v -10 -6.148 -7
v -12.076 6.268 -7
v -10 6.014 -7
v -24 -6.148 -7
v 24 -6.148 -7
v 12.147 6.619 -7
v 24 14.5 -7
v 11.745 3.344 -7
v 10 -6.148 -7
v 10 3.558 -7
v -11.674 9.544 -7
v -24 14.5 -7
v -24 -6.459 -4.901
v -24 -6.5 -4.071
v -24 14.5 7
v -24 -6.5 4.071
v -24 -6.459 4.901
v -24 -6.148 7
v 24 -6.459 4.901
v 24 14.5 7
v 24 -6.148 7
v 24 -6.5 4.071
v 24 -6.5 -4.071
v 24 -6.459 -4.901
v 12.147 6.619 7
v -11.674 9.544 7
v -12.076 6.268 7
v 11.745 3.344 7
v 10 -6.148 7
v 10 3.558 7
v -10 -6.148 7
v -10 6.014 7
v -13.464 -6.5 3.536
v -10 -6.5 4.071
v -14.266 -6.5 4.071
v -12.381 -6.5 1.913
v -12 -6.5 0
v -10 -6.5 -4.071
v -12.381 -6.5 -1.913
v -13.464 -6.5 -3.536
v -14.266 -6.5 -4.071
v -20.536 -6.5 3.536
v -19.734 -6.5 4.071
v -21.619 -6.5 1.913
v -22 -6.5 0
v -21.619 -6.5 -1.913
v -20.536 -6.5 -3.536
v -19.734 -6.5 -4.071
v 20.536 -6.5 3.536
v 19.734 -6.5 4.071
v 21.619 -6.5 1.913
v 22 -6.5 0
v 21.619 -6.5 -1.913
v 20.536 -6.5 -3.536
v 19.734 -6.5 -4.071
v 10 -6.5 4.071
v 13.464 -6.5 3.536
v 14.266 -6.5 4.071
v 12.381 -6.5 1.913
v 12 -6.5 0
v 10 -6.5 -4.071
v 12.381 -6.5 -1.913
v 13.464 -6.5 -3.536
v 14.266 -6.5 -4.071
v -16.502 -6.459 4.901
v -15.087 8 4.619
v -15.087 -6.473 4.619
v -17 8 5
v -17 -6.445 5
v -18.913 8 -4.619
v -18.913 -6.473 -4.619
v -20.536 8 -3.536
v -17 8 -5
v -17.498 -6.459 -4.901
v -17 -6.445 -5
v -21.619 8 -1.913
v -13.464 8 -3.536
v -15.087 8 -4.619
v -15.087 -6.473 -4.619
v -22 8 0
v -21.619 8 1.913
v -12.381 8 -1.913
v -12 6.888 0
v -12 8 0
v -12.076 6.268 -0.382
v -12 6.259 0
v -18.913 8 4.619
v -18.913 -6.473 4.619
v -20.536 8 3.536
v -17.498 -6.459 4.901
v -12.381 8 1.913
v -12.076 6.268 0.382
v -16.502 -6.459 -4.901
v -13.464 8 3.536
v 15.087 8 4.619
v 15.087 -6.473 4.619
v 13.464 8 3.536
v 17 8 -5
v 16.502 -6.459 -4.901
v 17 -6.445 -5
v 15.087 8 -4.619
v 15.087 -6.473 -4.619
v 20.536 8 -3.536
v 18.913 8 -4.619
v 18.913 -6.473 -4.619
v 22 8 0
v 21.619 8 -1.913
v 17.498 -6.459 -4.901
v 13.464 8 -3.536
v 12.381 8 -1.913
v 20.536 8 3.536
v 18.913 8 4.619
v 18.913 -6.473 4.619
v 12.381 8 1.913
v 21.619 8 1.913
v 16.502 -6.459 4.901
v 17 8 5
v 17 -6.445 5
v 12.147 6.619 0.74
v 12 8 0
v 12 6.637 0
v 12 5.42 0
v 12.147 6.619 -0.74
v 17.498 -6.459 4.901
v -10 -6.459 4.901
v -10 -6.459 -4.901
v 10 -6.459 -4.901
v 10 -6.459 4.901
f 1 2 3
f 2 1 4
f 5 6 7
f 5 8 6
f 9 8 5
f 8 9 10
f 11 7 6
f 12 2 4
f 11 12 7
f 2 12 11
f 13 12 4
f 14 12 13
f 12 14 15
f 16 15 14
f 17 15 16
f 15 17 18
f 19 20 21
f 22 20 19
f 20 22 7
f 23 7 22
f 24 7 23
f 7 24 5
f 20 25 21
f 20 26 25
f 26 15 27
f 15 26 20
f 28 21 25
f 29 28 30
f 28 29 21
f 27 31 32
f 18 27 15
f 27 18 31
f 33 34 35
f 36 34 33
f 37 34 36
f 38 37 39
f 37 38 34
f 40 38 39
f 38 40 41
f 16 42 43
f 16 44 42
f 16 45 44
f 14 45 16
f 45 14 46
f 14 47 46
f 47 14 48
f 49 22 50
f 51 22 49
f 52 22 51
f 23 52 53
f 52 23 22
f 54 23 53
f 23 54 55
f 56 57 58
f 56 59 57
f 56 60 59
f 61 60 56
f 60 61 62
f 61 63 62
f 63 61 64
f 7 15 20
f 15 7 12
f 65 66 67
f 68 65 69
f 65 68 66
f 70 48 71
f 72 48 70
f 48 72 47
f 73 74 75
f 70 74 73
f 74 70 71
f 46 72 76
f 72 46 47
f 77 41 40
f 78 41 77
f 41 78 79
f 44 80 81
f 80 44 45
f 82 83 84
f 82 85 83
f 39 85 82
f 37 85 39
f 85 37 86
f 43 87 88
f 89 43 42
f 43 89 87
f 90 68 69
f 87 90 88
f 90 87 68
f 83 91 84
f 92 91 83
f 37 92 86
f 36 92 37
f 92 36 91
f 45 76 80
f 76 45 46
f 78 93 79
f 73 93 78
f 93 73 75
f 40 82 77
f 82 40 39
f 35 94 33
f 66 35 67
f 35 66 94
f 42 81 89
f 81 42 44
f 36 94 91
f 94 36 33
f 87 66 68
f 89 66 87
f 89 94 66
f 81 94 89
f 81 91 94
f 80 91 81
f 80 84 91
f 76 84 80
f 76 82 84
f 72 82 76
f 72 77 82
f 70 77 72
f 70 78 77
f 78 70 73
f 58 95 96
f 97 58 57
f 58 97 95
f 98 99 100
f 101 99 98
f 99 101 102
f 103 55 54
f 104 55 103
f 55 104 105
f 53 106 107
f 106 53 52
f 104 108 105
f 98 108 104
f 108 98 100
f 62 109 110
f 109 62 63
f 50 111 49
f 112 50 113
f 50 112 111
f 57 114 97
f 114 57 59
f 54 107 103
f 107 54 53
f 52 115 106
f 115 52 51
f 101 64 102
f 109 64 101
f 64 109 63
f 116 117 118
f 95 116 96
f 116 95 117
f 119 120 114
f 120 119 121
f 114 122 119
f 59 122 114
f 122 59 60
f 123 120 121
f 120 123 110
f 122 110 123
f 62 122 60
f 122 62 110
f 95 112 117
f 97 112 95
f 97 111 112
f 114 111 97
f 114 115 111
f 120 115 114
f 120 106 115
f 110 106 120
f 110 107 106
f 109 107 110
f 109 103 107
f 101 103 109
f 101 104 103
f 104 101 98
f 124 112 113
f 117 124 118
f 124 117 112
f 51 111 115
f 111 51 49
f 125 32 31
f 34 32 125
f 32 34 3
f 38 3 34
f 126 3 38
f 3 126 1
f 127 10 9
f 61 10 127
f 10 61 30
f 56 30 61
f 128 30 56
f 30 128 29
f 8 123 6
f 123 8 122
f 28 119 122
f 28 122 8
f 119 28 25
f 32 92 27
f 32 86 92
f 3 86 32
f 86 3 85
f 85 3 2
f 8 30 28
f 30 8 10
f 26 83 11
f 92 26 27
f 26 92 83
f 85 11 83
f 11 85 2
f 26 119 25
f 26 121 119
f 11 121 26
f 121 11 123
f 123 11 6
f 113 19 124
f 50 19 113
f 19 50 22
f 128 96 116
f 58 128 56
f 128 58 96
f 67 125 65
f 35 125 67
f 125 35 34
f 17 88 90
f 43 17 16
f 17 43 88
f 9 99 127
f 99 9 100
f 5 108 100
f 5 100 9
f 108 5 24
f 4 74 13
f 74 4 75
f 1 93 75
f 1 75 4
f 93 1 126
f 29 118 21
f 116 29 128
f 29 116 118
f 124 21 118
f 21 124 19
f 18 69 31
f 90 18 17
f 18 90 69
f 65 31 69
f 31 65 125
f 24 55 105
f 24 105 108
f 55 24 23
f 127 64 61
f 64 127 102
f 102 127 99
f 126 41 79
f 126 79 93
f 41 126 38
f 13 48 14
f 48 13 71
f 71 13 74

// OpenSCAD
diameter=10;
height=4;
number=3;
distance=5;
baseline=30; 


module maghole(diameter,height,number,back) {
		translate([0,height*(number-2)/2,0])
        rotate([90,0,0])
         cylinder(r=diameter/2,h=height*(2*number-1),center=true);
    if(back == 1) {
		translate([0,-height*2*(number+1)/2,0])
        rotate([90,0,0])
         cylinder(r=diameter/2,h=height*number,center=true);
    }
}

module smaghole(diameter,height,number,back) {
		translate([0,.15+height*(number-2)/2,0])
        rotate([90,0,0])
         cylinder(r=0.3+diameter/2,h=height*(2*number-1),center=true);
    if(back == 1) {
		translate([0,-(0.15+height*2*(number+1)/2),0])
        rotate([90,0,0])
         cylinder(r=0.3+diameter/2,h=height*number,center=true);
    }
}
module mirror(diameter,height,number,distance,baseline) {
width=diameter+4;
depth=distance+height*number+4;
length=baseline+diameter+8;
mirrorthick = 2.7;
   difference() {
     translate([0,-height,0])
	   cube([width,  // Small dimension
            depth, // Optical path dim
		      length],center=true);
      translate([0,0,2+baseline/2])
             maghole(diameter,height,number,0);
     translate([0,0,-(2+baseline/2)])
             maghole(diameter,height,number,0);
     translate([0,depth/4,0])
          cube([width+2,depth+2,length-2*width],center=true);
    rotate([7,0,0])
     translate([0,0.6-depth/3,0.75])
          cube([width+2,mirrorthick+0.6,length-(2*diameter+4)],center=true);
     }
}

module sensor(diameter,height,number,distance,baseline) {
width=diameter+4;
depth=distance+height*number+4;
length=baseline+diameter+8;
mirrorthick = 2.6;
extra=2*width+4;

   difference() {
     translate([2+width/2,-height,0])
	   cube([extra,  // Small dimension
            depth, // Optical path dim
		      length],center=true);
      translate([0,0,2+baseline/2])
             smaghole(diameter,height,number,1);
     translate([0,0,-(2+baseline/2)])
             smaghole(diameter,height,number,1);
//LASER
     translate([0,0,4])
        rotate([90,0,0])
             cylinder(r=3.2,h=40,center=true,$fn=24);
//PhotoTransistor
     translate([0,0,-2])
        rotate([90,0,0])
             cylinder(r=2,h=40,center=true,$fn=12);
// TEMP SENSOR
     translate([2+width,0,0])
        rotate([90,0,0])
             cylinder(r=4.7,h=40,center=true);

     }

     difference() {
     translate([0,-4,-2.5])cube([5,6,5],center=true);
     translate([0,-8,0])
        cylinder(r=3.2,h=10,center=true,$fn=12);
     translate([0,0,-1.2])
        rotate([90,0,0])
             cylinder(r=0.6,h=40,center=true,$fn=6);
     translate([0,0,-2.8])
        rotate([90,0,0])
             cylinder(r=0.6,h=40,center=true,$fn=6);
     }
}

module jarwall() {
  difference() {
     cube([40,40,120],center=true);
	  translate([40,0,0])
	     cylinder(r=50,h=120,center=true,$fn=64);
	   }
}

module jar() {
	  translate([-8,110,-10])
	          cylinder(r=50,h=120,center=true,$fn=64);
}

module powerhole(dim) {
offset = dim+2;
  //  cylinder(r=dim,h=2*dim,center=true,$fn=10);
  //  translate([dim-1.6,0,0])
   //   cylinder(r=dim,h=dim,center=true,$fn=10);
    translate([dim-3,0,0]) cube([2*dim+2,2*dim-1,2*dim-1],center=true);
    translate([-offset,0,0])
      cylinder(r=1.1,h=2*dim,center=true,$fn=10);
    translate([offset+2,0,0])
      cylinder(r=1.1,h=2*dim,center=true,$fn=10);
}

module sensordevice() {
  wall = 32;
  side = 44;
  deep = 50;
  difference() { 
   sensor(diameter,height,number,distance,baseline);
   translate([6,-60,3]) jar();
  }
  translate([-7,-(wall+30),21]) cube([wall,side+12,3]);

     translate([-7,-(wall+30),-24])
         cube([wall,side+12,3]);

  difference() {
  translate([23.5,-(wall+7),0])
    rotate([0,90,0])
    cube([side,deep,3],center=true);
     translate([24,-54,12])
			rotate([0,90,0]) 
           powerhole(4.5);
  }
}
module mirrordevice() {
  difference() { 
   mirror(diameter,height,number,distance,baseline);
   translate([0,-3.3,0]) rotate([0,0,-90]) jarwall();
  }
}

rotate([0,90,180]) 
  // sensordevice();
   mirrordevice();



     
